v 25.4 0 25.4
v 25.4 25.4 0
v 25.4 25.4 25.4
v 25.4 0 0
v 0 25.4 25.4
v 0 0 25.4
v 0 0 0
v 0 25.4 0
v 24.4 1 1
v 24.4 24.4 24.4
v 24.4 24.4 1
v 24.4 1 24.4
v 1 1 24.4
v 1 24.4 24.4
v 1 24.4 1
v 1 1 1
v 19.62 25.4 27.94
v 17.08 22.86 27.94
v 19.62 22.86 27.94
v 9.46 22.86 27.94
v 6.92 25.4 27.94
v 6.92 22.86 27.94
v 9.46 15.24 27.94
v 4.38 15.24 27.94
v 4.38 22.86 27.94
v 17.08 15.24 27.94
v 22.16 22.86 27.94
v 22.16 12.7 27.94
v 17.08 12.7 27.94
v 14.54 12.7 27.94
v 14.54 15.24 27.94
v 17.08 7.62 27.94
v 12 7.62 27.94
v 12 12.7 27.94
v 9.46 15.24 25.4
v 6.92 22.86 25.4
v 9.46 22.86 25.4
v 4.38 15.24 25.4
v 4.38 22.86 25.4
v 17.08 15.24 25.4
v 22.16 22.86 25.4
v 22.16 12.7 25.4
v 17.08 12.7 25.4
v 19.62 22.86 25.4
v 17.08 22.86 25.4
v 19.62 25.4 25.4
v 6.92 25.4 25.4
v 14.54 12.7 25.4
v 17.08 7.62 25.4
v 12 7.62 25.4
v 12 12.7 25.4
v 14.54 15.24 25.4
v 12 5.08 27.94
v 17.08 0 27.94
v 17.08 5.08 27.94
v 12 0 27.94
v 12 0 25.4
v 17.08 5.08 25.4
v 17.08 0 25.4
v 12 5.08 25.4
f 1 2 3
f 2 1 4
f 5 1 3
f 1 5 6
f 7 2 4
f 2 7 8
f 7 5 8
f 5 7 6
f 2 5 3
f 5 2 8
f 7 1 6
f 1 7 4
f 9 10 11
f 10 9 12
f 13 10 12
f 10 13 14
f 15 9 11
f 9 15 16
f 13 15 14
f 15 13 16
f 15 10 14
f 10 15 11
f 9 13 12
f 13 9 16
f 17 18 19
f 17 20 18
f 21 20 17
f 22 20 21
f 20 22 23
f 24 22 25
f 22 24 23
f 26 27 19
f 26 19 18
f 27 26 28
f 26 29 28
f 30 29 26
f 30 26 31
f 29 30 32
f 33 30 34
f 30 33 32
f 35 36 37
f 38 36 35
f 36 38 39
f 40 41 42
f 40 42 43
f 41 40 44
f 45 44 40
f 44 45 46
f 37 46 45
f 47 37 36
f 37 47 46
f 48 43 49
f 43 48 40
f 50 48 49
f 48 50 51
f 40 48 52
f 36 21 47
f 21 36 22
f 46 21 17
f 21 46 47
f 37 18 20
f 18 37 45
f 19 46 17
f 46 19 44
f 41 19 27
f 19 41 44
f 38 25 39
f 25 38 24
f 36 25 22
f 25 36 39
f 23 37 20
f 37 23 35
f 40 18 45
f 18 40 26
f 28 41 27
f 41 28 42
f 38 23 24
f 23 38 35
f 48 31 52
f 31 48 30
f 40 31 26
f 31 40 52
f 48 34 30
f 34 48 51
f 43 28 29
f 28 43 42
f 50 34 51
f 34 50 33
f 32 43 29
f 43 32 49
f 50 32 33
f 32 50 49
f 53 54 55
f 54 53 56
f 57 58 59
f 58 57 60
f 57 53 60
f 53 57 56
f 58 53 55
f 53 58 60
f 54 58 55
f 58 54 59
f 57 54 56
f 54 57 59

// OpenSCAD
union() {
	difference() {
		cube(size = [25.4, 25.4, 25.4]);
		translate(v = [1, 1, 1]) {
			cube(size = [23.4, 23.4, 23.4]);
		}
	}
	translate(v = [4.38, 22.86, 25.4]) {
		union() {
			translate(v = [0, -0.0, 0]) {
				translate(v = [2.54, 0, 0]) {
					color(alpha = 1.0, c = "white") {
						cube(size = 2.54);
					}
				}
			}
			translate(v = [0, -0.0, 0]) {
				translate(v = [5.08, 0, 0]) {
					color(alpha = 1.0, c = "white") {
						cube(size = 2.54);
					}
				}
			}
			translate(v = [0, -0.0, 0]) {
				translate(v = [7.62, 0, 0]) {
					color(alpha = 1.0, c = "white") {
						cube(size = 2.54);
					}
				}
			}
			translate(v = [0, -0.0, 0]) {
				translate(v = [10.16, 0, 0]) {
					color(alpha = 1.0, c = "white") {
						cube(size = 2.54);
					}
				}
			}
			translate(v = [0, -0.0, 0]) {
				translate(v = [12.7, 0, 0]) {
					color(alpha = 1.0, c = "white") {
						cube(size = 2.54);
					}
				}
			}
			translate(v = [0, -2.54, 0]) {
				translate(v = [0.0, 0, 0]) {
					color(alpha = 1.0, c = "white") {
						cube(size = 2.54);
					}
				}
			}
			translate(v = [0, -2.54, 0]) {
				translate(v = [2.54, 0, 0]) {
					color(alpha = 1.0, c = "white") {
						cube(size = 2.54);
					}
				}
			}
			translate(v = [0, -2.54, 0]) {
				translate(v = [12.7, 0, 0]) {
					color(alpha = 1.0, c = "white") {
						cube(size = 2.54);
					}
				}
			}
			translate(v = [0, -2.54, 0]) {
				translate(v = [15.24, 0, 0]) {
					color(alpha = 1.0, c = "white") {
						cube(size = 2.54);
					}
				}
			}
			translate(v = [0, -5.08, 0]) {
				translate(v = [0.0, 0, 0]) {
					color(alpha = 1.0, c = "white") {
						cube(size = 2.54);
					}
				}
			}
			translate(v = [0, -5.08, 0]) {
				translate(v = [2.54, 0, 0]) {
					color(alpha = 1.0, c = "white") {
						cube(size = 2.54);
					}
				}
			}
			translate(v = [0, -5.08, 0]) {
				translate(v = [12.7, 0, 0]) {
					color(alpha = 1.0, c = "white") {
						cube(size = 2.54);
					}
				}
			}
			translate(v = [0, -5.08, 0]) {
				translate(v = [15.24, 0, 0]) {
					color(alpha = 1.0, c = "white") {
						cube(size = 2.54);
					}
				}
			}
			translate(v = [0, -7.62, 0]) {
				translate(v = [0.0, 0, 0]) {
					color(alpha = 1.0, c = "white") {
						cube(size = 2.54);
					}
				}
			}
			translate(v = [0, -7.62, 0]) {
				translate(v = [2.54, 0, 0]) {
					color(alpha = 1.0, c = "white") {
						cube(size = 2.54);
					}
				}
			}
			translate(v = [0, -7.62, 0]) {
				translate(v = [12.7, 0, 0]) {
					color(alpha = 1.0, c = "white") {
						cube(size = 2.54);
					}
				}
			}
			translate(v = [0, -7.62, 0]) {
				translate(v = [15.24, 0, 0]) {
					color(alpha = 1.0, c = "white") {
						cube(size = 2.54);
					}
				}
			}
			translate(v = [0, -10.16, 0]) {
				translate(v = [10.16, 0, 0]) {
					color(alpha = 1.0, c = "white") {
						cube(size = 2.54);
					}
				}
			}
			translate(v = [0, -10.16, 0]) {
				translate(v = [12.7, 0, 0]) {
					color(alpha = 1.0, c = "white") {
						cube(size = 2.54);
					}
				}
			}
			translate(v = [0, -10.16, 0]) {
				translate(v = [15.24, 0, 0]) {
					color(alpha = 1.0, c = "white") {
						cube(size = 2.54);
					}
				}
			}
			translate(v = [0, -12.7, 0]) {
				translate(v = [7.62, 0, 0]) {
					color(alpha = 1.0, c = "white") {
						cube(size = 2.54);
					}
				}
			}
			translate(v = [0, -12.7, 0]) {
				translate(v = [10.16, 0, 0]) {
					color(alpha = 1.0, c = "white") {
						cube(size = 2.54);
					}
				}
			}
			translate(v = [0, -15.24, 0]) {
				translate(v = [7.62, 0, 0]) {
					color(alpha = 1.0, c = "white") {
						cube(size = 2.54);
					}
				}
			}
			translate(v = [0, -15.24, 0]) {
				translate(v = [10.16, 0, 0]) {
					color(alpha = 1.0, c = "white") {
						cube(size = 2.54);
					}
				}
			}
			translate(v = [0, -20.32, 0]) {
				translate(v = [7.62, 0, 0]) {
					color(alpha = 1.0, c = "white") {
						cube(size = 2.54);
					}
				}
			}
			translate(v = [0, -20.32, 0]) {
				translate(v = [10.16, 0, 0]) {
					color(alpha = 1.0, c = "white") {
						cube(size = 2.54);
					}
				}
			}
			translate(v = [0, -22.86, 0]) {
				translate(v = [7.62, 0, 0]) {
					color(alpha = 1.0, c = "white") {
						cube(size = 2.54);
					}
				}
			}
			translate(v = [0, -22.86, 0]) {
				translate(v = [10.16, 0, 0]) {
					color(alpha = 1.0, c = "white") {
						cube(size = 2.54);
					}
				}
			}
		}
	}
}
